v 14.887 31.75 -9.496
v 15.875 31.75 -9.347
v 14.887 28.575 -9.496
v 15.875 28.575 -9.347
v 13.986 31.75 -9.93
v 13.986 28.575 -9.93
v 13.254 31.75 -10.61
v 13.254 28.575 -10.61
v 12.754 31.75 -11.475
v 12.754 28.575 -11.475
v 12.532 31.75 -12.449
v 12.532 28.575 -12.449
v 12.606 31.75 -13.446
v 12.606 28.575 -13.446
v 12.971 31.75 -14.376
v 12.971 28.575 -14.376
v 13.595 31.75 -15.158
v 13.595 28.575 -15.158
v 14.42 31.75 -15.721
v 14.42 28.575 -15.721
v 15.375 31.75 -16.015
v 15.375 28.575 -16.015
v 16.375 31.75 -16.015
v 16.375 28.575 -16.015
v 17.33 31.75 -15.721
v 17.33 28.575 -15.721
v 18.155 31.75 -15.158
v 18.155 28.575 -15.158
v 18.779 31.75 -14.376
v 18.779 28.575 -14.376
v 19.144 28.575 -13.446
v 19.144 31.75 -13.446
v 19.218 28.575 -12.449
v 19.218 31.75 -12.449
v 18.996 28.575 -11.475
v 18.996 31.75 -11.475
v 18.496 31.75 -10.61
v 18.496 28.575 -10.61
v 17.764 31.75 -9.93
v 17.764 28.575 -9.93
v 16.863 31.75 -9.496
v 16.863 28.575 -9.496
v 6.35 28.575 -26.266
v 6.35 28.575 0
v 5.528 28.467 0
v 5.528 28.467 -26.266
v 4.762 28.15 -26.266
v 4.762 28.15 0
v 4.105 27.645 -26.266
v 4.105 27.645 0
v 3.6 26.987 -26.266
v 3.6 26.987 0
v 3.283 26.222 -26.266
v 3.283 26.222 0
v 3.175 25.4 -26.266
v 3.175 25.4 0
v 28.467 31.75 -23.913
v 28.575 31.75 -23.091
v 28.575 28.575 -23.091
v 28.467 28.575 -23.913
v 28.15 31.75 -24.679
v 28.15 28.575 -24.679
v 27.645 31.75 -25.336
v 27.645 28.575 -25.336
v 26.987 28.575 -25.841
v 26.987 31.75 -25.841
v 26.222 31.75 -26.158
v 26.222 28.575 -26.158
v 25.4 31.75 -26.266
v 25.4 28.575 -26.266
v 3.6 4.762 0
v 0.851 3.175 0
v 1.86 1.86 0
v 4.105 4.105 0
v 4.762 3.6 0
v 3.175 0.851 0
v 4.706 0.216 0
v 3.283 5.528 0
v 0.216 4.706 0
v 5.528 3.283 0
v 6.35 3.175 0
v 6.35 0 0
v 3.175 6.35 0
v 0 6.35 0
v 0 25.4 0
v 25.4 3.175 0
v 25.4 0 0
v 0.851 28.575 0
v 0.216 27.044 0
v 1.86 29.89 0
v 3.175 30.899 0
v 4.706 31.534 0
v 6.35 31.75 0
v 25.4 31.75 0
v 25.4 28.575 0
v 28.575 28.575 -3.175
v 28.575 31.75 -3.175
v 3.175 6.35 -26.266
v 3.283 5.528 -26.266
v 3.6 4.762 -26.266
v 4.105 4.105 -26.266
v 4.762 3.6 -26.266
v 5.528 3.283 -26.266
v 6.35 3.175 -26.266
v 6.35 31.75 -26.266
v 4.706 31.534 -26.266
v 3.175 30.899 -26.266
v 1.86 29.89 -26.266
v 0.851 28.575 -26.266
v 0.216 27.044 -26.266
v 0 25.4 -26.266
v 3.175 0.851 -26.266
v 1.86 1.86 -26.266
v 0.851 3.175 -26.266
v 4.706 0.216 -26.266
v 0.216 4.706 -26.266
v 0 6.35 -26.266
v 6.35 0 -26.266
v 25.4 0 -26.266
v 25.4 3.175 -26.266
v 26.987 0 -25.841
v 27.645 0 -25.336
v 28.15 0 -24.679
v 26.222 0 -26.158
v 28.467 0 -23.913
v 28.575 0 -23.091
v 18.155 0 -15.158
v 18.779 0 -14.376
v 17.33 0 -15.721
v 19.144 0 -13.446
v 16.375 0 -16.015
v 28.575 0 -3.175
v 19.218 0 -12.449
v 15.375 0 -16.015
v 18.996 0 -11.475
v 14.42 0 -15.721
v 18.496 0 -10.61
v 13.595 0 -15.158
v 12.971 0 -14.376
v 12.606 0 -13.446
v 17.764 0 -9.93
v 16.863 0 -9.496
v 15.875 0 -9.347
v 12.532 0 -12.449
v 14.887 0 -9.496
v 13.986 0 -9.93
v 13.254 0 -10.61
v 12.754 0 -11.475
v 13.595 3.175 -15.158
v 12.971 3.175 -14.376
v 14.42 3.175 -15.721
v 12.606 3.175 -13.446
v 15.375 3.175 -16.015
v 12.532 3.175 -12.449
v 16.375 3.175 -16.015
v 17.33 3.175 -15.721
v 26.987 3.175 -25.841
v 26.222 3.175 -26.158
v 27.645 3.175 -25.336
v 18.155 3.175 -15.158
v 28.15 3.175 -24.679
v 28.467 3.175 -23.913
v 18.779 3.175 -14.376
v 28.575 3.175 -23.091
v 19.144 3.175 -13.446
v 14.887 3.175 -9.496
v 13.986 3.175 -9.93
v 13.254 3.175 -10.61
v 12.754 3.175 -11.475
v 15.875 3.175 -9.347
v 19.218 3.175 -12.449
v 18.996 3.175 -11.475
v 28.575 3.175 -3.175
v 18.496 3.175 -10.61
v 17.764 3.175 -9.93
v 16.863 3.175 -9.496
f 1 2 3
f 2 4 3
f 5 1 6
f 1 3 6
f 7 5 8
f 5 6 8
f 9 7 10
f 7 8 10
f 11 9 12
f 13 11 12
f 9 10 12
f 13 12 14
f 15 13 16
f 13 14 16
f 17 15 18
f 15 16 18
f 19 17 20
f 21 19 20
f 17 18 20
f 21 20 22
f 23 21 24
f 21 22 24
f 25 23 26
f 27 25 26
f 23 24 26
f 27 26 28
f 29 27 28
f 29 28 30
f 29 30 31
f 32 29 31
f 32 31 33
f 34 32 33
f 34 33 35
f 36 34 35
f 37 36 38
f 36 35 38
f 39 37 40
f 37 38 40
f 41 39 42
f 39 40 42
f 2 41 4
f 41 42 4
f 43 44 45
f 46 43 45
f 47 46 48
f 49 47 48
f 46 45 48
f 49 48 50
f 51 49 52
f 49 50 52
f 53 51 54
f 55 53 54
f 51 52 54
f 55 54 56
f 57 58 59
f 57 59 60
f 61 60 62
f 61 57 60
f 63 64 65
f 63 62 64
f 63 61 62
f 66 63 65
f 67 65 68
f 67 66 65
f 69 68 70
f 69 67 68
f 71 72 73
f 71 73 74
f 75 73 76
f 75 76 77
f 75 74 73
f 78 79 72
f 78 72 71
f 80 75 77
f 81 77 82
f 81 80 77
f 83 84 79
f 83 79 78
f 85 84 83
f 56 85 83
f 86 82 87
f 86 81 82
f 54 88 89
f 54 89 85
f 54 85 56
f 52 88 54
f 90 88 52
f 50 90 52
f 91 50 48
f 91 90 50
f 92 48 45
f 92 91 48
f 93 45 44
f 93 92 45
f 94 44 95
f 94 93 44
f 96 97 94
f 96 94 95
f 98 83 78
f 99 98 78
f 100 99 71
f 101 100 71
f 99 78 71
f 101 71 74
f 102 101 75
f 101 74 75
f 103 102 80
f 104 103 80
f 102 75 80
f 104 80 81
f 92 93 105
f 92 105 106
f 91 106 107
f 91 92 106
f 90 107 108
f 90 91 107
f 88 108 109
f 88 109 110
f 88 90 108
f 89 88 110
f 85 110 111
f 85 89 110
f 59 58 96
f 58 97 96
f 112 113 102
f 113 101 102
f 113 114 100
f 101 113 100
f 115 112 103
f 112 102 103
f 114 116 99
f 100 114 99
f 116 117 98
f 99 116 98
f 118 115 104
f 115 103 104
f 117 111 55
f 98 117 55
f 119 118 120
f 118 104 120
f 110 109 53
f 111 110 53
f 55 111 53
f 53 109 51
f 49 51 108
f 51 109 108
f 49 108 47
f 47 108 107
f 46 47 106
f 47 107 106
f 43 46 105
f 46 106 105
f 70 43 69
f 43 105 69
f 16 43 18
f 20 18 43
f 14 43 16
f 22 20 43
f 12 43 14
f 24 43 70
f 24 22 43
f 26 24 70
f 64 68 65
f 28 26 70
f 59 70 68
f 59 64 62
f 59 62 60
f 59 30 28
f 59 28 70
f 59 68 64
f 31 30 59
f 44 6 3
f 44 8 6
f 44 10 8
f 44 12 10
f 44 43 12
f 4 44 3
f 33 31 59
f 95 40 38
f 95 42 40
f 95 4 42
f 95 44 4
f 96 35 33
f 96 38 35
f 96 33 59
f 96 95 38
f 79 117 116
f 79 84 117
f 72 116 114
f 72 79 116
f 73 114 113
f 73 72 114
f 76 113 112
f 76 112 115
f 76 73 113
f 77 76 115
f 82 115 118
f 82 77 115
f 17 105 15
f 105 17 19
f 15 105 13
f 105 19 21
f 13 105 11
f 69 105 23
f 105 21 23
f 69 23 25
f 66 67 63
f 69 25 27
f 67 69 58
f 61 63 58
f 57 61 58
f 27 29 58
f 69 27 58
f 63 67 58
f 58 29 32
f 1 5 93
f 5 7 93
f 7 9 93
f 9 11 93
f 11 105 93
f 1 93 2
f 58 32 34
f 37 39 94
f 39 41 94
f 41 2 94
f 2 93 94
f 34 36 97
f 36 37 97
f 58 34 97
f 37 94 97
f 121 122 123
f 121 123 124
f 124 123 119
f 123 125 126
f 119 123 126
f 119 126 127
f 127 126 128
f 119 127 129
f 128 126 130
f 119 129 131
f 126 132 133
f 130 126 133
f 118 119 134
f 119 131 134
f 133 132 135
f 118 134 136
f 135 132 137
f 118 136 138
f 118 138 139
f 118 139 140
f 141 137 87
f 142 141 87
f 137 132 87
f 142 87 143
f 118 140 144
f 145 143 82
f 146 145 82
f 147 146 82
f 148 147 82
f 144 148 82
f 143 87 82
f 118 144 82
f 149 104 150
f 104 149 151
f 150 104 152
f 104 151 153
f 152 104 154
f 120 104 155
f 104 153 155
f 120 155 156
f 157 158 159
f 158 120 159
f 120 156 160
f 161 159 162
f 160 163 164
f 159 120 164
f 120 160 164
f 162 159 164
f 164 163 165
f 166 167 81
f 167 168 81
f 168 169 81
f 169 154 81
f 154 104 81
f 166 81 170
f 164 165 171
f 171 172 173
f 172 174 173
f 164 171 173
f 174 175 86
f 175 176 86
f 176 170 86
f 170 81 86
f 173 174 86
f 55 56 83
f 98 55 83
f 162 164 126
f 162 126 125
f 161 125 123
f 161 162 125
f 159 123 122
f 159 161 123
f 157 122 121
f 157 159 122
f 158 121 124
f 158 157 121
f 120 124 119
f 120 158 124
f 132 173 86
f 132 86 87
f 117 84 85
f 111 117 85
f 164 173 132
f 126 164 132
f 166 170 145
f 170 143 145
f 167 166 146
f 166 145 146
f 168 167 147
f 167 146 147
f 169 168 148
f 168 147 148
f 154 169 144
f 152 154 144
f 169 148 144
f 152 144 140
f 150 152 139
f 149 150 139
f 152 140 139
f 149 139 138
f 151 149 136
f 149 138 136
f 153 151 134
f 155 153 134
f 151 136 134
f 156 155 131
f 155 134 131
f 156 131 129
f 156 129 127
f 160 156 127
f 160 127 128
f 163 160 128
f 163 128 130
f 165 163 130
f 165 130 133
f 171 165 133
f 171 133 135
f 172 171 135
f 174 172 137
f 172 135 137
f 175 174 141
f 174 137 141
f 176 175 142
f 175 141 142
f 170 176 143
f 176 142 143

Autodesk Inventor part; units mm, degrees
ref_plane "YZ Plane" through (0, 0, 0) normal (1, 0, 0) x (0, 1, 0)
ref_plane "XZ Plane" through (0, 0, 0) normal (0, 1, 0) x (-1, 0, 0)
ref_plane "XY Plane" through (0, 0, 0) normal (0, 0, 1) x (1, 0, 0)
sketch "Sketch1" plane through (0, 0, 0) normal (0, 0, 1) x (1, 0, 0)
  line L0 (6.35, 28.575) -> (25.4, 28.575)
  line L1 (6.35, 31.75) -> (25.4, 31.75)
  line L2 (25.4, 0) -> (6.35, 0)
  arc A0 (0, 6.35) -> (6.35, 0) centre (6.35, 6.35) ccw
  line L3 (0, 6.35) -> (0, 25.4)
  arc A1 (6.35, 31.75) -> (0, 25.4) centre (6.35, 25.4) ccw
  line L4 (6.35, 31.75) -> (25.4, 31.75)
  line L5 (25.4, 28.575) -> (6.35, 28.575)
  arc A2 (6.35, 28.575) -> (3.175, 25.4) centre (6.35, 25.4) ccw
  line L6 (3.175, 25.4) -> (3.175, 6.35)
  arc A3 (3.175, 6.35) -> (6.35, 3.175) centre (6.35, 6.35) ccw
  line L7 (6.35, 3.175) -> (25.4, 3.175)
  line L8 (28.575, 3.175) -> (28.575, 0)
  line L9 (25.4, 31.75) -> (28.575, 31.75)
  line L10 (28.575, 28.575) -> (25.4, 28.575)
  line L11 (28.575, 31.75) -> (28.575, 28.575)
  line L12 (28.575, 0) -> (25.4, 0)
  line L13 (28.575, 3.175) -> (28.575, 0)
  line L14 (25.4, 3.175) -> (28.575, 3.175)
  point P0 (0, 0)
extrude "Extrusion1" add sketch "Sketch1" against normal blind 762
chamfer "Chamfer1" distance 3.175 angle 45 4 edges at (28.575, 30.1625, 0) (28.575, 1.5875, 0) (28.575, 30.1625, -762) (28.575, 1.5875, -762)
sketch "Sketch2" plane through (6.35, 31.75, 0) normal (0, 1, 0) x (1, 0, 0)
  line L0 (19.05, 0) -> (0, 0) projected
  line L1 (22.225, 3.175) -> (22.225, 758.825) projected
  point P0 (-6.35, 0)
  point P1 (9.525, 12.7)
  dimension "d5" = 12.7
  dimension "d6" = 12.7
hole "Hole1" at (15.875, 31.75, -12.7) direction (0, -1, 0) diameter 6.7056 end through all
pattern_linear "Rectangular Pattern1" count 30 spacing 25.4 along (0, 0, -1) of "Hole1"
sketch "Sketch3" plane through (0, 6.35, 0) normal (-1, 0, 0) x (0, 0, 1)
  line L0 (-0.2722, 19.0092) -> (-759.0056, 19.0092)
  line L1 (-759.0056, 19.0092) -> (-759.0056, 0.0408)
  line L2 (-0.2722, 0.0408) -> (-759.0056, 0.0408)
  line L3 (-0.2722, 0.0408) -> (-0.2722, 19.0092)
  circle A0 centre (-698.5852, 9.525) radius 4.78
  circle A1 centre (-111.2243, 9.525) radius 4.78
  circle A2 centre (-188.7416, 9.525) radius 3.6672
  circle A3 centre (-277.2605, 9.525) radius 3.6672
  circle A4 centre (-481.9921, 9.525) radius 3.6672
  circle A5 centre (-570.511, 9.525) radius 3.6672
  circle A6 centre (-469.3591, 9.525) radius 3.6672
  circle A7 centre (-583.1692, 9.525) radius 3.6672
  circle A8 centre (-289.9187, 9.525) radius 3.6672
  circle A9 centre (-176.1087, 9.525) radius 3.6672
  circle A10 centre (-551.6311, 9.525) radius 4.78
  circle A11 centre (-526.34, 9.525) radius 4.78
  circle A12 centre (-501.0489, 9.525) radius 4.78
  circle A13 centre (-258.2289, 9.525) radius 4.78
  circle A14 centre (-232.9378, 9.525) radius 4.78
  circle A15 centre (-207.6467, 9.525) radius 4.78
  circle A16 centre (-607.2589, 9.525) radius 1.5807
  circle A17 centre (-152.0189, 9.525) radius 1.5807
  circle A18 centre (-379.6389, 5.9842) radius 4.78
  circle A19 centre (-85.9332, 9.525) radius 4.78
  circle A20 centre (-673.294, 9.525) radius 4.78
  circle A21 centre (-648.0029, 9.525) radius 4.78
  circle A22 centre (-63.5, 9.525) radius 4.8006
  point P0 (0, -6.35)
  point P1 (-759.0056, -6.2819)
  dimension "d21" = 9.6012
extrude "Extrusion2" [suppressed]
sketch "Sketch4" plane through (6.35, 31.75, 0) normal (0, 1, 0) x (1, 0, 0)
  line L0 (-18.2452, 26.2664) -> (88.0083, 26.2664)
  line L1 (88.0083, 26.2664) -> (88.0083, 1027.7541)
  line L2 (88.0083, 1027.7541) -> (-18.2452, 1027.7541)
  line L3 (-18.2452, 1027.7541) -> (-18.2452, 26.2664)
  point P0 (-6.35, 0)
extrude "Extrusion3" cut sketch "Sketch4" against normal blind 50.8
sketch "Sketch5" plane through (0, 6.35, 0) normal (-1, 0, 0) x (0, 0, 1)
  circle A0 centre (-63.5, 9.525) radius 4.8006
  dimension "d23" = 9.6012
extrude "Extrusion4" cut sketch "Sketch5" against normal through all
fillet "Fillet1" radius 3.175 2 edges at (28.575, 30.1625, -26.2664) (28.575, 1.5875, -26.2664)
properties part number "niblet" material "Aluminum 6061"
